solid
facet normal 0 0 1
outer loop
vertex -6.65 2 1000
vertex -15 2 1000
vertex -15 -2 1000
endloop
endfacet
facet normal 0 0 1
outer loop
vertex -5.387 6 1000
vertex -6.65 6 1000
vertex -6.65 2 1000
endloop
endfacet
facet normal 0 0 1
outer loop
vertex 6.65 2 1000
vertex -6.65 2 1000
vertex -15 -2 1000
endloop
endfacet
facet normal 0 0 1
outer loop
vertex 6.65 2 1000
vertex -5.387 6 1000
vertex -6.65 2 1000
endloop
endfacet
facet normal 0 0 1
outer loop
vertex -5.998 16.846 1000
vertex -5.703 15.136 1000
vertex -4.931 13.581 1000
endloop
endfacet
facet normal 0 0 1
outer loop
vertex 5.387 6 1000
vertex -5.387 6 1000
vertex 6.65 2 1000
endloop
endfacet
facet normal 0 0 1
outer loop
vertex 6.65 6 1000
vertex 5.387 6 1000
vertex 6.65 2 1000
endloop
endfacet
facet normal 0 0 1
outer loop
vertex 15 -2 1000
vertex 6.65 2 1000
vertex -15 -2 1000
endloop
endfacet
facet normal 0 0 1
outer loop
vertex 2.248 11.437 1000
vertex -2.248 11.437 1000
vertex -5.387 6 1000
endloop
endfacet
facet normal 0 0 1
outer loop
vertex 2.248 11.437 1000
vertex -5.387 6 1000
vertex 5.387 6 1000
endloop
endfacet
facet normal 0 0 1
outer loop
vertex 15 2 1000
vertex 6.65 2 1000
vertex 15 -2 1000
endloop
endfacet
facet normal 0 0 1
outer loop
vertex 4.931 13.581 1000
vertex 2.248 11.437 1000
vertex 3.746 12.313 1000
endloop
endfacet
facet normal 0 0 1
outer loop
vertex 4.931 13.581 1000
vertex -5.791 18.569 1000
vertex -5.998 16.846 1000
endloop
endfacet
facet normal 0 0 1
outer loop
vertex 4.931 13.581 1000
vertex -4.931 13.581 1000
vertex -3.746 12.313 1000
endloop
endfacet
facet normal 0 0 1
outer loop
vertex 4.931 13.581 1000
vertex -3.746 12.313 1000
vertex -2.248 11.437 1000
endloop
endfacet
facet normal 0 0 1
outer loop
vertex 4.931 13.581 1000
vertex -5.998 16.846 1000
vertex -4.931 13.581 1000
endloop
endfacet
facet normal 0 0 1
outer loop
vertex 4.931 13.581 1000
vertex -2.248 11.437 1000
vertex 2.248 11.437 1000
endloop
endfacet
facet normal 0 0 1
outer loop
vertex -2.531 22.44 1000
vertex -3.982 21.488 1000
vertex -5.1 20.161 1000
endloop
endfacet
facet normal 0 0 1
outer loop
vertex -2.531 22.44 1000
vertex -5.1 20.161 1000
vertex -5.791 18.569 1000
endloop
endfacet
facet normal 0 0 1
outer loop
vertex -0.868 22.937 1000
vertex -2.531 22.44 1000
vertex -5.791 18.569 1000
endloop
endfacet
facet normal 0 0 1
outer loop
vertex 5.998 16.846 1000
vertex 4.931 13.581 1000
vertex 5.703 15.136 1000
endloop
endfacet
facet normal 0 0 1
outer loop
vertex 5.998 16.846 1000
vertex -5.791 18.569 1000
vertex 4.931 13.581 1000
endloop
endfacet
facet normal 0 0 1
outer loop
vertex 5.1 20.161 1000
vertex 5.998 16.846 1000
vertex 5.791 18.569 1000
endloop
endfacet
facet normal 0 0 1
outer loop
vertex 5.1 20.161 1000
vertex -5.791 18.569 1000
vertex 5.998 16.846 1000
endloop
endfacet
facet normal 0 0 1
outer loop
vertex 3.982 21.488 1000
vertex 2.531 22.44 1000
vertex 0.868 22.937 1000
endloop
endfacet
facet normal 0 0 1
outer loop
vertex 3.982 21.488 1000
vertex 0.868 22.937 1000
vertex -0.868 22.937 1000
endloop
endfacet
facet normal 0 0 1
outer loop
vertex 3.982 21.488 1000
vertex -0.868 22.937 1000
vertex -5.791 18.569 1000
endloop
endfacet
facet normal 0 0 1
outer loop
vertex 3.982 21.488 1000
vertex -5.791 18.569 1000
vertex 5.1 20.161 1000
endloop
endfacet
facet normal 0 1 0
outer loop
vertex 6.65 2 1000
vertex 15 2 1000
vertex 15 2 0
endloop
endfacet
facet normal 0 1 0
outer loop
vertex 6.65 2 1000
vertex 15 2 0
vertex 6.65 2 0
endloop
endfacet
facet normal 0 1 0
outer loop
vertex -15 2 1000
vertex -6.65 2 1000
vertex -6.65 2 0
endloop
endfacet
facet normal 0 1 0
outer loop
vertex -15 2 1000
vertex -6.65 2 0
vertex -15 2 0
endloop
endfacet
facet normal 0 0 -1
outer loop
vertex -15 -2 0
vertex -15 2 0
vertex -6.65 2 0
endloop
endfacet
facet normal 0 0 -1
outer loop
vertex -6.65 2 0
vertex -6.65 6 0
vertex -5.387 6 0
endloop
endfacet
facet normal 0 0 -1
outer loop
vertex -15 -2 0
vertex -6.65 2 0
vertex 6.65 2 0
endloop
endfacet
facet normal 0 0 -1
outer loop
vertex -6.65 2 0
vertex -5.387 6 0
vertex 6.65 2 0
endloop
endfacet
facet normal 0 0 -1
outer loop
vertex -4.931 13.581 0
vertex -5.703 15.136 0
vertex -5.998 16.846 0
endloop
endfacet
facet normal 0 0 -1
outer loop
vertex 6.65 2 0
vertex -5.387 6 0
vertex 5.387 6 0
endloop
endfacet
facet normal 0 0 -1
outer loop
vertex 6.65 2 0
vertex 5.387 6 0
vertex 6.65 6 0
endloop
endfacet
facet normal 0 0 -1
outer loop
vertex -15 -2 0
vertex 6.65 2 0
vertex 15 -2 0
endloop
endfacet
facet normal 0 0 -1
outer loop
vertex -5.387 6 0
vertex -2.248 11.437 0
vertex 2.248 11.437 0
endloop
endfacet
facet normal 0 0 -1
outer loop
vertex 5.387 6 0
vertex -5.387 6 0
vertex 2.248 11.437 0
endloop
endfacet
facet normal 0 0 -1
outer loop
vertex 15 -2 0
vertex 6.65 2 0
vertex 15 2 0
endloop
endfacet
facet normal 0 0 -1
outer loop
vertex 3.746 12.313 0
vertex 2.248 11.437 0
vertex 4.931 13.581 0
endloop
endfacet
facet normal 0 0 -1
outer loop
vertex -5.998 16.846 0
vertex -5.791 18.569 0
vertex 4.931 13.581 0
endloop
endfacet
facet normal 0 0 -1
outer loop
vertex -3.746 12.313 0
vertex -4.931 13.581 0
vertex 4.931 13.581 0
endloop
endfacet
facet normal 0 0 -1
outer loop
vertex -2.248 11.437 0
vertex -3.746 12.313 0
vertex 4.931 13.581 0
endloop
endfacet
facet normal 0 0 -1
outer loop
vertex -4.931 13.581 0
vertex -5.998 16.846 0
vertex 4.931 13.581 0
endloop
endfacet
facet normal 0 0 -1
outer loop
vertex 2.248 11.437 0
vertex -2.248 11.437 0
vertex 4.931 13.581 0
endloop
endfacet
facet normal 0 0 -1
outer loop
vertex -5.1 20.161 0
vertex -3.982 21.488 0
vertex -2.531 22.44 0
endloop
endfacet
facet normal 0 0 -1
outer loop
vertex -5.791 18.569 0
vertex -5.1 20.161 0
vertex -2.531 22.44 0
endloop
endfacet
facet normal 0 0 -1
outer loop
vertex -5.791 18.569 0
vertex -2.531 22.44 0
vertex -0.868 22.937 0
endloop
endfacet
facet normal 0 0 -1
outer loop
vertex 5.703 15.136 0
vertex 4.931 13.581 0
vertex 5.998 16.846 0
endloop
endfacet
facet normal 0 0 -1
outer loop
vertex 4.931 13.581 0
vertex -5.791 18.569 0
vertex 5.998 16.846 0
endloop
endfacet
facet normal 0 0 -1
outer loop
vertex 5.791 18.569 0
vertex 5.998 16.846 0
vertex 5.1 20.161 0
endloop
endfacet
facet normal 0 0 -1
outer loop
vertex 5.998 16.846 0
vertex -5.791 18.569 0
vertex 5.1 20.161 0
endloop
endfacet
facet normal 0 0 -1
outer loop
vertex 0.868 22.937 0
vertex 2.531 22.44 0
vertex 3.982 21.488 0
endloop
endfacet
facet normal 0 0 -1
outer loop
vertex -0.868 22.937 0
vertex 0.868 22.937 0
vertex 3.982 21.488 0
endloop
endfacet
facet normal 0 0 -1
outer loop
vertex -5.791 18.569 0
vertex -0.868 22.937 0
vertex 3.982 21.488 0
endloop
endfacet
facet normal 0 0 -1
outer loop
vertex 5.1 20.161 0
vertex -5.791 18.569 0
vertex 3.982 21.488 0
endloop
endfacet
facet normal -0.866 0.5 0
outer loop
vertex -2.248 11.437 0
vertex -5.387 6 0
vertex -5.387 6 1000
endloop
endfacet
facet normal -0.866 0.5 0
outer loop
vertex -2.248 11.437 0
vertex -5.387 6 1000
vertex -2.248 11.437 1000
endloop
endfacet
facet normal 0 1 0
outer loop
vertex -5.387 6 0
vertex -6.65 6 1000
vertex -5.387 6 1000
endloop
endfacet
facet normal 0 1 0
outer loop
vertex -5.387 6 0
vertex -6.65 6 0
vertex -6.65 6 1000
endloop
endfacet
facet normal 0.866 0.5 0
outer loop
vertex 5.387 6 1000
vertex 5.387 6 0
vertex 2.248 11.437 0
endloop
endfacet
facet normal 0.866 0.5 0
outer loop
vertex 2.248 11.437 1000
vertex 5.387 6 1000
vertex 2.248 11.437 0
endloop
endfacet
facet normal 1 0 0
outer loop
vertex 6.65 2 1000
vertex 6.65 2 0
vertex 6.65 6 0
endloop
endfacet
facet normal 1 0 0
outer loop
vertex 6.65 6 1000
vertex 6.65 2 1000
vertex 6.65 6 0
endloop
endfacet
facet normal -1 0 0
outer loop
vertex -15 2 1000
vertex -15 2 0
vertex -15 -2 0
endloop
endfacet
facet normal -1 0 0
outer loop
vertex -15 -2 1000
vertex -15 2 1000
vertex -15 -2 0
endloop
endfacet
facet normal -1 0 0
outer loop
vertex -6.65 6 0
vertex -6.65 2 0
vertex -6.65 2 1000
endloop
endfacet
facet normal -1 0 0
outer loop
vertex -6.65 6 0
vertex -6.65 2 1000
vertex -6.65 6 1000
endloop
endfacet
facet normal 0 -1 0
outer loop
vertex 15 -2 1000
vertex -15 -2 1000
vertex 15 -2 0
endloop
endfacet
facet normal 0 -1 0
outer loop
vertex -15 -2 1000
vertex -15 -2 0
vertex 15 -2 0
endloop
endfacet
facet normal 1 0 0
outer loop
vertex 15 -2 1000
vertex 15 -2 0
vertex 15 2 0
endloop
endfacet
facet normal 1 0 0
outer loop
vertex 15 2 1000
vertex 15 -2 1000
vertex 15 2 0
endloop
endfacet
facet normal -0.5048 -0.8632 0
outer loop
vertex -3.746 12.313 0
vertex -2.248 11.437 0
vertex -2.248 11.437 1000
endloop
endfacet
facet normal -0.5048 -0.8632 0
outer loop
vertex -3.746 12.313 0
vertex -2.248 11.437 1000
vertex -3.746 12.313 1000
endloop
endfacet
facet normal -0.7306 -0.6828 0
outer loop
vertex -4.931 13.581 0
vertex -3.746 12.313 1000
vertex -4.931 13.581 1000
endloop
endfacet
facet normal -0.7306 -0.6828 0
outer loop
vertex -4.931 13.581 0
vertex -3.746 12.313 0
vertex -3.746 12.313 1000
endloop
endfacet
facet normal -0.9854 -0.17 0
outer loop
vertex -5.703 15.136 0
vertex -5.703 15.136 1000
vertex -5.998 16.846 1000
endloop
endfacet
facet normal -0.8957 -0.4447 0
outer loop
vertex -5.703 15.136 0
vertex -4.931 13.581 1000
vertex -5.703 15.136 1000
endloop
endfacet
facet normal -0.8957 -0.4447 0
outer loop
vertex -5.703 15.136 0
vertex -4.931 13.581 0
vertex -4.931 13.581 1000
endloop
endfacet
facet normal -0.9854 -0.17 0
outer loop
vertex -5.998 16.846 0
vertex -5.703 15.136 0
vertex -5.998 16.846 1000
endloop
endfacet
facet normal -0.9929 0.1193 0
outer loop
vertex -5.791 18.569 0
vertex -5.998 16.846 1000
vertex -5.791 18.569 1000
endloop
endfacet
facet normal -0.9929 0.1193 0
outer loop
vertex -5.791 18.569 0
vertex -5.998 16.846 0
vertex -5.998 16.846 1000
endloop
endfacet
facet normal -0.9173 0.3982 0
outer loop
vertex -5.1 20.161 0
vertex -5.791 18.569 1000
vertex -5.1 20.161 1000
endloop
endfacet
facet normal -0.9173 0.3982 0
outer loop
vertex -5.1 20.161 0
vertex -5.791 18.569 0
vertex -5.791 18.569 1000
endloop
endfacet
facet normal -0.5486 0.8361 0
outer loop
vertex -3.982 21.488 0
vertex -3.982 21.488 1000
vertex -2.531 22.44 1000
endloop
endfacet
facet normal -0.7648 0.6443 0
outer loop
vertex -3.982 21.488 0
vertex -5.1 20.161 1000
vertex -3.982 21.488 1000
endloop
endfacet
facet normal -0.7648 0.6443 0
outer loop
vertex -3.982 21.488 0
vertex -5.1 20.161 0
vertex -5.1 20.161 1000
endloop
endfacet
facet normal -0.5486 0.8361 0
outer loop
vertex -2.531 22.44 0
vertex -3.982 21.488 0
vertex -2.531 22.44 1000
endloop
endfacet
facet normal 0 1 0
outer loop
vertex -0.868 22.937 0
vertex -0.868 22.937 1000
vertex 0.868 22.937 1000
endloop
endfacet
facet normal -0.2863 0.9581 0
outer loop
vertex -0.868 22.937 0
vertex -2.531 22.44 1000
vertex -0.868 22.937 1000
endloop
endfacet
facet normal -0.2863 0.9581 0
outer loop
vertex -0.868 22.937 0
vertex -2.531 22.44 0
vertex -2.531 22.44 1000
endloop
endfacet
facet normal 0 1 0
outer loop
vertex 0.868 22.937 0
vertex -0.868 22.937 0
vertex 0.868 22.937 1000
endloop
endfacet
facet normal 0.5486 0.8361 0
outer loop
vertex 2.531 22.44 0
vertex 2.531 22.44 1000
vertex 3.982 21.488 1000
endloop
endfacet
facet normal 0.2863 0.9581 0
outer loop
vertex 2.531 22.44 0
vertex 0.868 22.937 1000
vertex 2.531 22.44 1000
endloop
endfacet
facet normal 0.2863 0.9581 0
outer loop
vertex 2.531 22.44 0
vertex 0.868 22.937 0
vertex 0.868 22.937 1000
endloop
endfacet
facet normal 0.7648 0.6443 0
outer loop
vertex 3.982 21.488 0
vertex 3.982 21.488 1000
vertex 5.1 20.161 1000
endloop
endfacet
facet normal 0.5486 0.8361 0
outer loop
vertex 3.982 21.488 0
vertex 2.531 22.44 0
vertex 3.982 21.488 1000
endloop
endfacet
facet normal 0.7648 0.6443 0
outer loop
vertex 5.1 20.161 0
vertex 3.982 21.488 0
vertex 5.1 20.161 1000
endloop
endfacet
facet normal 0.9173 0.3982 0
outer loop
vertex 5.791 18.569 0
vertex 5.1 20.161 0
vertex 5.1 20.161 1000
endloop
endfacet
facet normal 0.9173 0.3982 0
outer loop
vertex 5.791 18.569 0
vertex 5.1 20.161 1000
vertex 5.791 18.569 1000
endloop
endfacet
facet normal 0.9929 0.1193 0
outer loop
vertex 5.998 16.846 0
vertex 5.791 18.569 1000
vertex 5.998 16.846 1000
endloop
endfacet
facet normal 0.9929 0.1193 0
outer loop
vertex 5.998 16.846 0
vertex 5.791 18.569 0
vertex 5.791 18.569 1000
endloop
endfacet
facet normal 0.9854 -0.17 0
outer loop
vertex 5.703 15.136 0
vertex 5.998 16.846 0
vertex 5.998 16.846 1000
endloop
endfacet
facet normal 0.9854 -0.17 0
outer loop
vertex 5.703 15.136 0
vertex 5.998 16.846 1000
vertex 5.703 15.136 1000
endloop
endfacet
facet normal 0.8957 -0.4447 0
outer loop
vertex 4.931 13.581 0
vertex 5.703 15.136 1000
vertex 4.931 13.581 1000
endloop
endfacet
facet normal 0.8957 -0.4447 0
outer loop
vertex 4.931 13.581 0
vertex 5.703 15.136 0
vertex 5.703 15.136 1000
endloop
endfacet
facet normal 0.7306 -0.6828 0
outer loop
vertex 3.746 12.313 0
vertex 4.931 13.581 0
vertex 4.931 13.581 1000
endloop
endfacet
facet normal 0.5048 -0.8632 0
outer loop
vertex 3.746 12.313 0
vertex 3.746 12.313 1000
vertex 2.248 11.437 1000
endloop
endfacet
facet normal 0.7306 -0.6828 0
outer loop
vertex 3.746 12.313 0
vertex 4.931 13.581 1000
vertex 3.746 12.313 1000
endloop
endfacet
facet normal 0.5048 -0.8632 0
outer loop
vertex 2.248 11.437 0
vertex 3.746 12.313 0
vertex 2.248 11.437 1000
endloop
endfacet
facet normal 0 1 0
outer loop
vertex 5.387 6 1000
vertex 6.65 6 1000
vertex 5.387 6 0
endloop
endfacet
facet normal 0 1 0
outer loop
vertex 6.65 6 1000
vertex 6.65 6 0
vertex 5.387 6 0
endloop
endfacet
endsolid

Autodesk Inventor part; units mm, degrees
ref_plane "YZ Plane" through (0, 0, 0) normal (1, 0, 0) x (0, 1, 0)
ref_plane "XZ Plane" through (0, 0, 0) normal (0, 1, 0) x (-1, 0, 0)
ref_plane "XY Plane" through (0, 0, 0) normal (0, 0, 1) x (1, 0, 0)
sketch "Skizze1" plane through (0, 0, 0) normal (0, 0, 1) x (1, 0, 0)
  line L0 (-15, 2) -> (-15, -2)
  line L1 (-15, -2) -> (15, -2)
  line L2 (15, -2) -> (15, 2)
  line L3 (15, 2) -> (-15, -2) construction
  line L4 (-15, 2) -> (15, -2) construction
  line L5 (-15, 2) -> (-6.65, 2) construction
  line L6 (15, 2) -> (6.65, 2) construction
  line L7 (-6.65, 2) -> (-6.65, 6)
  line L8 (-6.65, 6) -> (-5.387, 6)
  line L9 (6.65, 2) -> (6.65, 6)
  line L10 (6.65, 6) -> (5.387, 6)
  line L11 (-5.387, 6) -> (-2.248, 11.4369)
  line L12 (-5.387, 6) -> (0.891, 6) construction
  line L13 (5.387, 6) -> (2.248, 11.4369)
  line L14 (5.387, 6) -> (11.665, 6) construction
  arc A0 (2.248, 11.4369) -> (-2.248, 11.4369) centre (0, 16.9999) ccw
  line L15 (15, 2) -> (6.65, 2)
  line L16 (-6.65, 2) -> (-15, 2)
  point P0 (0, 0)
  dimension "d0" = 30
  dimension "d1" = 4
  dimension "d2" = 8.35
  dimension "d3" = 8.35
  dimension "d4" = 4
  dimension "d5" = 1.263
  dimension "d6" = 4
  dimension "d7" = 1.263
  dimension "d8" = 6.278
  dimension "d9" = 60
  dimension "d10" = 6.278
  dimension "d11" = 120
  dimension "d12" = 6
extrude "Extrusion1" add sketch "Skizze1" along normal blind 1000
properties part number "1000mmFührung" material "Edelstahl, 440C"
